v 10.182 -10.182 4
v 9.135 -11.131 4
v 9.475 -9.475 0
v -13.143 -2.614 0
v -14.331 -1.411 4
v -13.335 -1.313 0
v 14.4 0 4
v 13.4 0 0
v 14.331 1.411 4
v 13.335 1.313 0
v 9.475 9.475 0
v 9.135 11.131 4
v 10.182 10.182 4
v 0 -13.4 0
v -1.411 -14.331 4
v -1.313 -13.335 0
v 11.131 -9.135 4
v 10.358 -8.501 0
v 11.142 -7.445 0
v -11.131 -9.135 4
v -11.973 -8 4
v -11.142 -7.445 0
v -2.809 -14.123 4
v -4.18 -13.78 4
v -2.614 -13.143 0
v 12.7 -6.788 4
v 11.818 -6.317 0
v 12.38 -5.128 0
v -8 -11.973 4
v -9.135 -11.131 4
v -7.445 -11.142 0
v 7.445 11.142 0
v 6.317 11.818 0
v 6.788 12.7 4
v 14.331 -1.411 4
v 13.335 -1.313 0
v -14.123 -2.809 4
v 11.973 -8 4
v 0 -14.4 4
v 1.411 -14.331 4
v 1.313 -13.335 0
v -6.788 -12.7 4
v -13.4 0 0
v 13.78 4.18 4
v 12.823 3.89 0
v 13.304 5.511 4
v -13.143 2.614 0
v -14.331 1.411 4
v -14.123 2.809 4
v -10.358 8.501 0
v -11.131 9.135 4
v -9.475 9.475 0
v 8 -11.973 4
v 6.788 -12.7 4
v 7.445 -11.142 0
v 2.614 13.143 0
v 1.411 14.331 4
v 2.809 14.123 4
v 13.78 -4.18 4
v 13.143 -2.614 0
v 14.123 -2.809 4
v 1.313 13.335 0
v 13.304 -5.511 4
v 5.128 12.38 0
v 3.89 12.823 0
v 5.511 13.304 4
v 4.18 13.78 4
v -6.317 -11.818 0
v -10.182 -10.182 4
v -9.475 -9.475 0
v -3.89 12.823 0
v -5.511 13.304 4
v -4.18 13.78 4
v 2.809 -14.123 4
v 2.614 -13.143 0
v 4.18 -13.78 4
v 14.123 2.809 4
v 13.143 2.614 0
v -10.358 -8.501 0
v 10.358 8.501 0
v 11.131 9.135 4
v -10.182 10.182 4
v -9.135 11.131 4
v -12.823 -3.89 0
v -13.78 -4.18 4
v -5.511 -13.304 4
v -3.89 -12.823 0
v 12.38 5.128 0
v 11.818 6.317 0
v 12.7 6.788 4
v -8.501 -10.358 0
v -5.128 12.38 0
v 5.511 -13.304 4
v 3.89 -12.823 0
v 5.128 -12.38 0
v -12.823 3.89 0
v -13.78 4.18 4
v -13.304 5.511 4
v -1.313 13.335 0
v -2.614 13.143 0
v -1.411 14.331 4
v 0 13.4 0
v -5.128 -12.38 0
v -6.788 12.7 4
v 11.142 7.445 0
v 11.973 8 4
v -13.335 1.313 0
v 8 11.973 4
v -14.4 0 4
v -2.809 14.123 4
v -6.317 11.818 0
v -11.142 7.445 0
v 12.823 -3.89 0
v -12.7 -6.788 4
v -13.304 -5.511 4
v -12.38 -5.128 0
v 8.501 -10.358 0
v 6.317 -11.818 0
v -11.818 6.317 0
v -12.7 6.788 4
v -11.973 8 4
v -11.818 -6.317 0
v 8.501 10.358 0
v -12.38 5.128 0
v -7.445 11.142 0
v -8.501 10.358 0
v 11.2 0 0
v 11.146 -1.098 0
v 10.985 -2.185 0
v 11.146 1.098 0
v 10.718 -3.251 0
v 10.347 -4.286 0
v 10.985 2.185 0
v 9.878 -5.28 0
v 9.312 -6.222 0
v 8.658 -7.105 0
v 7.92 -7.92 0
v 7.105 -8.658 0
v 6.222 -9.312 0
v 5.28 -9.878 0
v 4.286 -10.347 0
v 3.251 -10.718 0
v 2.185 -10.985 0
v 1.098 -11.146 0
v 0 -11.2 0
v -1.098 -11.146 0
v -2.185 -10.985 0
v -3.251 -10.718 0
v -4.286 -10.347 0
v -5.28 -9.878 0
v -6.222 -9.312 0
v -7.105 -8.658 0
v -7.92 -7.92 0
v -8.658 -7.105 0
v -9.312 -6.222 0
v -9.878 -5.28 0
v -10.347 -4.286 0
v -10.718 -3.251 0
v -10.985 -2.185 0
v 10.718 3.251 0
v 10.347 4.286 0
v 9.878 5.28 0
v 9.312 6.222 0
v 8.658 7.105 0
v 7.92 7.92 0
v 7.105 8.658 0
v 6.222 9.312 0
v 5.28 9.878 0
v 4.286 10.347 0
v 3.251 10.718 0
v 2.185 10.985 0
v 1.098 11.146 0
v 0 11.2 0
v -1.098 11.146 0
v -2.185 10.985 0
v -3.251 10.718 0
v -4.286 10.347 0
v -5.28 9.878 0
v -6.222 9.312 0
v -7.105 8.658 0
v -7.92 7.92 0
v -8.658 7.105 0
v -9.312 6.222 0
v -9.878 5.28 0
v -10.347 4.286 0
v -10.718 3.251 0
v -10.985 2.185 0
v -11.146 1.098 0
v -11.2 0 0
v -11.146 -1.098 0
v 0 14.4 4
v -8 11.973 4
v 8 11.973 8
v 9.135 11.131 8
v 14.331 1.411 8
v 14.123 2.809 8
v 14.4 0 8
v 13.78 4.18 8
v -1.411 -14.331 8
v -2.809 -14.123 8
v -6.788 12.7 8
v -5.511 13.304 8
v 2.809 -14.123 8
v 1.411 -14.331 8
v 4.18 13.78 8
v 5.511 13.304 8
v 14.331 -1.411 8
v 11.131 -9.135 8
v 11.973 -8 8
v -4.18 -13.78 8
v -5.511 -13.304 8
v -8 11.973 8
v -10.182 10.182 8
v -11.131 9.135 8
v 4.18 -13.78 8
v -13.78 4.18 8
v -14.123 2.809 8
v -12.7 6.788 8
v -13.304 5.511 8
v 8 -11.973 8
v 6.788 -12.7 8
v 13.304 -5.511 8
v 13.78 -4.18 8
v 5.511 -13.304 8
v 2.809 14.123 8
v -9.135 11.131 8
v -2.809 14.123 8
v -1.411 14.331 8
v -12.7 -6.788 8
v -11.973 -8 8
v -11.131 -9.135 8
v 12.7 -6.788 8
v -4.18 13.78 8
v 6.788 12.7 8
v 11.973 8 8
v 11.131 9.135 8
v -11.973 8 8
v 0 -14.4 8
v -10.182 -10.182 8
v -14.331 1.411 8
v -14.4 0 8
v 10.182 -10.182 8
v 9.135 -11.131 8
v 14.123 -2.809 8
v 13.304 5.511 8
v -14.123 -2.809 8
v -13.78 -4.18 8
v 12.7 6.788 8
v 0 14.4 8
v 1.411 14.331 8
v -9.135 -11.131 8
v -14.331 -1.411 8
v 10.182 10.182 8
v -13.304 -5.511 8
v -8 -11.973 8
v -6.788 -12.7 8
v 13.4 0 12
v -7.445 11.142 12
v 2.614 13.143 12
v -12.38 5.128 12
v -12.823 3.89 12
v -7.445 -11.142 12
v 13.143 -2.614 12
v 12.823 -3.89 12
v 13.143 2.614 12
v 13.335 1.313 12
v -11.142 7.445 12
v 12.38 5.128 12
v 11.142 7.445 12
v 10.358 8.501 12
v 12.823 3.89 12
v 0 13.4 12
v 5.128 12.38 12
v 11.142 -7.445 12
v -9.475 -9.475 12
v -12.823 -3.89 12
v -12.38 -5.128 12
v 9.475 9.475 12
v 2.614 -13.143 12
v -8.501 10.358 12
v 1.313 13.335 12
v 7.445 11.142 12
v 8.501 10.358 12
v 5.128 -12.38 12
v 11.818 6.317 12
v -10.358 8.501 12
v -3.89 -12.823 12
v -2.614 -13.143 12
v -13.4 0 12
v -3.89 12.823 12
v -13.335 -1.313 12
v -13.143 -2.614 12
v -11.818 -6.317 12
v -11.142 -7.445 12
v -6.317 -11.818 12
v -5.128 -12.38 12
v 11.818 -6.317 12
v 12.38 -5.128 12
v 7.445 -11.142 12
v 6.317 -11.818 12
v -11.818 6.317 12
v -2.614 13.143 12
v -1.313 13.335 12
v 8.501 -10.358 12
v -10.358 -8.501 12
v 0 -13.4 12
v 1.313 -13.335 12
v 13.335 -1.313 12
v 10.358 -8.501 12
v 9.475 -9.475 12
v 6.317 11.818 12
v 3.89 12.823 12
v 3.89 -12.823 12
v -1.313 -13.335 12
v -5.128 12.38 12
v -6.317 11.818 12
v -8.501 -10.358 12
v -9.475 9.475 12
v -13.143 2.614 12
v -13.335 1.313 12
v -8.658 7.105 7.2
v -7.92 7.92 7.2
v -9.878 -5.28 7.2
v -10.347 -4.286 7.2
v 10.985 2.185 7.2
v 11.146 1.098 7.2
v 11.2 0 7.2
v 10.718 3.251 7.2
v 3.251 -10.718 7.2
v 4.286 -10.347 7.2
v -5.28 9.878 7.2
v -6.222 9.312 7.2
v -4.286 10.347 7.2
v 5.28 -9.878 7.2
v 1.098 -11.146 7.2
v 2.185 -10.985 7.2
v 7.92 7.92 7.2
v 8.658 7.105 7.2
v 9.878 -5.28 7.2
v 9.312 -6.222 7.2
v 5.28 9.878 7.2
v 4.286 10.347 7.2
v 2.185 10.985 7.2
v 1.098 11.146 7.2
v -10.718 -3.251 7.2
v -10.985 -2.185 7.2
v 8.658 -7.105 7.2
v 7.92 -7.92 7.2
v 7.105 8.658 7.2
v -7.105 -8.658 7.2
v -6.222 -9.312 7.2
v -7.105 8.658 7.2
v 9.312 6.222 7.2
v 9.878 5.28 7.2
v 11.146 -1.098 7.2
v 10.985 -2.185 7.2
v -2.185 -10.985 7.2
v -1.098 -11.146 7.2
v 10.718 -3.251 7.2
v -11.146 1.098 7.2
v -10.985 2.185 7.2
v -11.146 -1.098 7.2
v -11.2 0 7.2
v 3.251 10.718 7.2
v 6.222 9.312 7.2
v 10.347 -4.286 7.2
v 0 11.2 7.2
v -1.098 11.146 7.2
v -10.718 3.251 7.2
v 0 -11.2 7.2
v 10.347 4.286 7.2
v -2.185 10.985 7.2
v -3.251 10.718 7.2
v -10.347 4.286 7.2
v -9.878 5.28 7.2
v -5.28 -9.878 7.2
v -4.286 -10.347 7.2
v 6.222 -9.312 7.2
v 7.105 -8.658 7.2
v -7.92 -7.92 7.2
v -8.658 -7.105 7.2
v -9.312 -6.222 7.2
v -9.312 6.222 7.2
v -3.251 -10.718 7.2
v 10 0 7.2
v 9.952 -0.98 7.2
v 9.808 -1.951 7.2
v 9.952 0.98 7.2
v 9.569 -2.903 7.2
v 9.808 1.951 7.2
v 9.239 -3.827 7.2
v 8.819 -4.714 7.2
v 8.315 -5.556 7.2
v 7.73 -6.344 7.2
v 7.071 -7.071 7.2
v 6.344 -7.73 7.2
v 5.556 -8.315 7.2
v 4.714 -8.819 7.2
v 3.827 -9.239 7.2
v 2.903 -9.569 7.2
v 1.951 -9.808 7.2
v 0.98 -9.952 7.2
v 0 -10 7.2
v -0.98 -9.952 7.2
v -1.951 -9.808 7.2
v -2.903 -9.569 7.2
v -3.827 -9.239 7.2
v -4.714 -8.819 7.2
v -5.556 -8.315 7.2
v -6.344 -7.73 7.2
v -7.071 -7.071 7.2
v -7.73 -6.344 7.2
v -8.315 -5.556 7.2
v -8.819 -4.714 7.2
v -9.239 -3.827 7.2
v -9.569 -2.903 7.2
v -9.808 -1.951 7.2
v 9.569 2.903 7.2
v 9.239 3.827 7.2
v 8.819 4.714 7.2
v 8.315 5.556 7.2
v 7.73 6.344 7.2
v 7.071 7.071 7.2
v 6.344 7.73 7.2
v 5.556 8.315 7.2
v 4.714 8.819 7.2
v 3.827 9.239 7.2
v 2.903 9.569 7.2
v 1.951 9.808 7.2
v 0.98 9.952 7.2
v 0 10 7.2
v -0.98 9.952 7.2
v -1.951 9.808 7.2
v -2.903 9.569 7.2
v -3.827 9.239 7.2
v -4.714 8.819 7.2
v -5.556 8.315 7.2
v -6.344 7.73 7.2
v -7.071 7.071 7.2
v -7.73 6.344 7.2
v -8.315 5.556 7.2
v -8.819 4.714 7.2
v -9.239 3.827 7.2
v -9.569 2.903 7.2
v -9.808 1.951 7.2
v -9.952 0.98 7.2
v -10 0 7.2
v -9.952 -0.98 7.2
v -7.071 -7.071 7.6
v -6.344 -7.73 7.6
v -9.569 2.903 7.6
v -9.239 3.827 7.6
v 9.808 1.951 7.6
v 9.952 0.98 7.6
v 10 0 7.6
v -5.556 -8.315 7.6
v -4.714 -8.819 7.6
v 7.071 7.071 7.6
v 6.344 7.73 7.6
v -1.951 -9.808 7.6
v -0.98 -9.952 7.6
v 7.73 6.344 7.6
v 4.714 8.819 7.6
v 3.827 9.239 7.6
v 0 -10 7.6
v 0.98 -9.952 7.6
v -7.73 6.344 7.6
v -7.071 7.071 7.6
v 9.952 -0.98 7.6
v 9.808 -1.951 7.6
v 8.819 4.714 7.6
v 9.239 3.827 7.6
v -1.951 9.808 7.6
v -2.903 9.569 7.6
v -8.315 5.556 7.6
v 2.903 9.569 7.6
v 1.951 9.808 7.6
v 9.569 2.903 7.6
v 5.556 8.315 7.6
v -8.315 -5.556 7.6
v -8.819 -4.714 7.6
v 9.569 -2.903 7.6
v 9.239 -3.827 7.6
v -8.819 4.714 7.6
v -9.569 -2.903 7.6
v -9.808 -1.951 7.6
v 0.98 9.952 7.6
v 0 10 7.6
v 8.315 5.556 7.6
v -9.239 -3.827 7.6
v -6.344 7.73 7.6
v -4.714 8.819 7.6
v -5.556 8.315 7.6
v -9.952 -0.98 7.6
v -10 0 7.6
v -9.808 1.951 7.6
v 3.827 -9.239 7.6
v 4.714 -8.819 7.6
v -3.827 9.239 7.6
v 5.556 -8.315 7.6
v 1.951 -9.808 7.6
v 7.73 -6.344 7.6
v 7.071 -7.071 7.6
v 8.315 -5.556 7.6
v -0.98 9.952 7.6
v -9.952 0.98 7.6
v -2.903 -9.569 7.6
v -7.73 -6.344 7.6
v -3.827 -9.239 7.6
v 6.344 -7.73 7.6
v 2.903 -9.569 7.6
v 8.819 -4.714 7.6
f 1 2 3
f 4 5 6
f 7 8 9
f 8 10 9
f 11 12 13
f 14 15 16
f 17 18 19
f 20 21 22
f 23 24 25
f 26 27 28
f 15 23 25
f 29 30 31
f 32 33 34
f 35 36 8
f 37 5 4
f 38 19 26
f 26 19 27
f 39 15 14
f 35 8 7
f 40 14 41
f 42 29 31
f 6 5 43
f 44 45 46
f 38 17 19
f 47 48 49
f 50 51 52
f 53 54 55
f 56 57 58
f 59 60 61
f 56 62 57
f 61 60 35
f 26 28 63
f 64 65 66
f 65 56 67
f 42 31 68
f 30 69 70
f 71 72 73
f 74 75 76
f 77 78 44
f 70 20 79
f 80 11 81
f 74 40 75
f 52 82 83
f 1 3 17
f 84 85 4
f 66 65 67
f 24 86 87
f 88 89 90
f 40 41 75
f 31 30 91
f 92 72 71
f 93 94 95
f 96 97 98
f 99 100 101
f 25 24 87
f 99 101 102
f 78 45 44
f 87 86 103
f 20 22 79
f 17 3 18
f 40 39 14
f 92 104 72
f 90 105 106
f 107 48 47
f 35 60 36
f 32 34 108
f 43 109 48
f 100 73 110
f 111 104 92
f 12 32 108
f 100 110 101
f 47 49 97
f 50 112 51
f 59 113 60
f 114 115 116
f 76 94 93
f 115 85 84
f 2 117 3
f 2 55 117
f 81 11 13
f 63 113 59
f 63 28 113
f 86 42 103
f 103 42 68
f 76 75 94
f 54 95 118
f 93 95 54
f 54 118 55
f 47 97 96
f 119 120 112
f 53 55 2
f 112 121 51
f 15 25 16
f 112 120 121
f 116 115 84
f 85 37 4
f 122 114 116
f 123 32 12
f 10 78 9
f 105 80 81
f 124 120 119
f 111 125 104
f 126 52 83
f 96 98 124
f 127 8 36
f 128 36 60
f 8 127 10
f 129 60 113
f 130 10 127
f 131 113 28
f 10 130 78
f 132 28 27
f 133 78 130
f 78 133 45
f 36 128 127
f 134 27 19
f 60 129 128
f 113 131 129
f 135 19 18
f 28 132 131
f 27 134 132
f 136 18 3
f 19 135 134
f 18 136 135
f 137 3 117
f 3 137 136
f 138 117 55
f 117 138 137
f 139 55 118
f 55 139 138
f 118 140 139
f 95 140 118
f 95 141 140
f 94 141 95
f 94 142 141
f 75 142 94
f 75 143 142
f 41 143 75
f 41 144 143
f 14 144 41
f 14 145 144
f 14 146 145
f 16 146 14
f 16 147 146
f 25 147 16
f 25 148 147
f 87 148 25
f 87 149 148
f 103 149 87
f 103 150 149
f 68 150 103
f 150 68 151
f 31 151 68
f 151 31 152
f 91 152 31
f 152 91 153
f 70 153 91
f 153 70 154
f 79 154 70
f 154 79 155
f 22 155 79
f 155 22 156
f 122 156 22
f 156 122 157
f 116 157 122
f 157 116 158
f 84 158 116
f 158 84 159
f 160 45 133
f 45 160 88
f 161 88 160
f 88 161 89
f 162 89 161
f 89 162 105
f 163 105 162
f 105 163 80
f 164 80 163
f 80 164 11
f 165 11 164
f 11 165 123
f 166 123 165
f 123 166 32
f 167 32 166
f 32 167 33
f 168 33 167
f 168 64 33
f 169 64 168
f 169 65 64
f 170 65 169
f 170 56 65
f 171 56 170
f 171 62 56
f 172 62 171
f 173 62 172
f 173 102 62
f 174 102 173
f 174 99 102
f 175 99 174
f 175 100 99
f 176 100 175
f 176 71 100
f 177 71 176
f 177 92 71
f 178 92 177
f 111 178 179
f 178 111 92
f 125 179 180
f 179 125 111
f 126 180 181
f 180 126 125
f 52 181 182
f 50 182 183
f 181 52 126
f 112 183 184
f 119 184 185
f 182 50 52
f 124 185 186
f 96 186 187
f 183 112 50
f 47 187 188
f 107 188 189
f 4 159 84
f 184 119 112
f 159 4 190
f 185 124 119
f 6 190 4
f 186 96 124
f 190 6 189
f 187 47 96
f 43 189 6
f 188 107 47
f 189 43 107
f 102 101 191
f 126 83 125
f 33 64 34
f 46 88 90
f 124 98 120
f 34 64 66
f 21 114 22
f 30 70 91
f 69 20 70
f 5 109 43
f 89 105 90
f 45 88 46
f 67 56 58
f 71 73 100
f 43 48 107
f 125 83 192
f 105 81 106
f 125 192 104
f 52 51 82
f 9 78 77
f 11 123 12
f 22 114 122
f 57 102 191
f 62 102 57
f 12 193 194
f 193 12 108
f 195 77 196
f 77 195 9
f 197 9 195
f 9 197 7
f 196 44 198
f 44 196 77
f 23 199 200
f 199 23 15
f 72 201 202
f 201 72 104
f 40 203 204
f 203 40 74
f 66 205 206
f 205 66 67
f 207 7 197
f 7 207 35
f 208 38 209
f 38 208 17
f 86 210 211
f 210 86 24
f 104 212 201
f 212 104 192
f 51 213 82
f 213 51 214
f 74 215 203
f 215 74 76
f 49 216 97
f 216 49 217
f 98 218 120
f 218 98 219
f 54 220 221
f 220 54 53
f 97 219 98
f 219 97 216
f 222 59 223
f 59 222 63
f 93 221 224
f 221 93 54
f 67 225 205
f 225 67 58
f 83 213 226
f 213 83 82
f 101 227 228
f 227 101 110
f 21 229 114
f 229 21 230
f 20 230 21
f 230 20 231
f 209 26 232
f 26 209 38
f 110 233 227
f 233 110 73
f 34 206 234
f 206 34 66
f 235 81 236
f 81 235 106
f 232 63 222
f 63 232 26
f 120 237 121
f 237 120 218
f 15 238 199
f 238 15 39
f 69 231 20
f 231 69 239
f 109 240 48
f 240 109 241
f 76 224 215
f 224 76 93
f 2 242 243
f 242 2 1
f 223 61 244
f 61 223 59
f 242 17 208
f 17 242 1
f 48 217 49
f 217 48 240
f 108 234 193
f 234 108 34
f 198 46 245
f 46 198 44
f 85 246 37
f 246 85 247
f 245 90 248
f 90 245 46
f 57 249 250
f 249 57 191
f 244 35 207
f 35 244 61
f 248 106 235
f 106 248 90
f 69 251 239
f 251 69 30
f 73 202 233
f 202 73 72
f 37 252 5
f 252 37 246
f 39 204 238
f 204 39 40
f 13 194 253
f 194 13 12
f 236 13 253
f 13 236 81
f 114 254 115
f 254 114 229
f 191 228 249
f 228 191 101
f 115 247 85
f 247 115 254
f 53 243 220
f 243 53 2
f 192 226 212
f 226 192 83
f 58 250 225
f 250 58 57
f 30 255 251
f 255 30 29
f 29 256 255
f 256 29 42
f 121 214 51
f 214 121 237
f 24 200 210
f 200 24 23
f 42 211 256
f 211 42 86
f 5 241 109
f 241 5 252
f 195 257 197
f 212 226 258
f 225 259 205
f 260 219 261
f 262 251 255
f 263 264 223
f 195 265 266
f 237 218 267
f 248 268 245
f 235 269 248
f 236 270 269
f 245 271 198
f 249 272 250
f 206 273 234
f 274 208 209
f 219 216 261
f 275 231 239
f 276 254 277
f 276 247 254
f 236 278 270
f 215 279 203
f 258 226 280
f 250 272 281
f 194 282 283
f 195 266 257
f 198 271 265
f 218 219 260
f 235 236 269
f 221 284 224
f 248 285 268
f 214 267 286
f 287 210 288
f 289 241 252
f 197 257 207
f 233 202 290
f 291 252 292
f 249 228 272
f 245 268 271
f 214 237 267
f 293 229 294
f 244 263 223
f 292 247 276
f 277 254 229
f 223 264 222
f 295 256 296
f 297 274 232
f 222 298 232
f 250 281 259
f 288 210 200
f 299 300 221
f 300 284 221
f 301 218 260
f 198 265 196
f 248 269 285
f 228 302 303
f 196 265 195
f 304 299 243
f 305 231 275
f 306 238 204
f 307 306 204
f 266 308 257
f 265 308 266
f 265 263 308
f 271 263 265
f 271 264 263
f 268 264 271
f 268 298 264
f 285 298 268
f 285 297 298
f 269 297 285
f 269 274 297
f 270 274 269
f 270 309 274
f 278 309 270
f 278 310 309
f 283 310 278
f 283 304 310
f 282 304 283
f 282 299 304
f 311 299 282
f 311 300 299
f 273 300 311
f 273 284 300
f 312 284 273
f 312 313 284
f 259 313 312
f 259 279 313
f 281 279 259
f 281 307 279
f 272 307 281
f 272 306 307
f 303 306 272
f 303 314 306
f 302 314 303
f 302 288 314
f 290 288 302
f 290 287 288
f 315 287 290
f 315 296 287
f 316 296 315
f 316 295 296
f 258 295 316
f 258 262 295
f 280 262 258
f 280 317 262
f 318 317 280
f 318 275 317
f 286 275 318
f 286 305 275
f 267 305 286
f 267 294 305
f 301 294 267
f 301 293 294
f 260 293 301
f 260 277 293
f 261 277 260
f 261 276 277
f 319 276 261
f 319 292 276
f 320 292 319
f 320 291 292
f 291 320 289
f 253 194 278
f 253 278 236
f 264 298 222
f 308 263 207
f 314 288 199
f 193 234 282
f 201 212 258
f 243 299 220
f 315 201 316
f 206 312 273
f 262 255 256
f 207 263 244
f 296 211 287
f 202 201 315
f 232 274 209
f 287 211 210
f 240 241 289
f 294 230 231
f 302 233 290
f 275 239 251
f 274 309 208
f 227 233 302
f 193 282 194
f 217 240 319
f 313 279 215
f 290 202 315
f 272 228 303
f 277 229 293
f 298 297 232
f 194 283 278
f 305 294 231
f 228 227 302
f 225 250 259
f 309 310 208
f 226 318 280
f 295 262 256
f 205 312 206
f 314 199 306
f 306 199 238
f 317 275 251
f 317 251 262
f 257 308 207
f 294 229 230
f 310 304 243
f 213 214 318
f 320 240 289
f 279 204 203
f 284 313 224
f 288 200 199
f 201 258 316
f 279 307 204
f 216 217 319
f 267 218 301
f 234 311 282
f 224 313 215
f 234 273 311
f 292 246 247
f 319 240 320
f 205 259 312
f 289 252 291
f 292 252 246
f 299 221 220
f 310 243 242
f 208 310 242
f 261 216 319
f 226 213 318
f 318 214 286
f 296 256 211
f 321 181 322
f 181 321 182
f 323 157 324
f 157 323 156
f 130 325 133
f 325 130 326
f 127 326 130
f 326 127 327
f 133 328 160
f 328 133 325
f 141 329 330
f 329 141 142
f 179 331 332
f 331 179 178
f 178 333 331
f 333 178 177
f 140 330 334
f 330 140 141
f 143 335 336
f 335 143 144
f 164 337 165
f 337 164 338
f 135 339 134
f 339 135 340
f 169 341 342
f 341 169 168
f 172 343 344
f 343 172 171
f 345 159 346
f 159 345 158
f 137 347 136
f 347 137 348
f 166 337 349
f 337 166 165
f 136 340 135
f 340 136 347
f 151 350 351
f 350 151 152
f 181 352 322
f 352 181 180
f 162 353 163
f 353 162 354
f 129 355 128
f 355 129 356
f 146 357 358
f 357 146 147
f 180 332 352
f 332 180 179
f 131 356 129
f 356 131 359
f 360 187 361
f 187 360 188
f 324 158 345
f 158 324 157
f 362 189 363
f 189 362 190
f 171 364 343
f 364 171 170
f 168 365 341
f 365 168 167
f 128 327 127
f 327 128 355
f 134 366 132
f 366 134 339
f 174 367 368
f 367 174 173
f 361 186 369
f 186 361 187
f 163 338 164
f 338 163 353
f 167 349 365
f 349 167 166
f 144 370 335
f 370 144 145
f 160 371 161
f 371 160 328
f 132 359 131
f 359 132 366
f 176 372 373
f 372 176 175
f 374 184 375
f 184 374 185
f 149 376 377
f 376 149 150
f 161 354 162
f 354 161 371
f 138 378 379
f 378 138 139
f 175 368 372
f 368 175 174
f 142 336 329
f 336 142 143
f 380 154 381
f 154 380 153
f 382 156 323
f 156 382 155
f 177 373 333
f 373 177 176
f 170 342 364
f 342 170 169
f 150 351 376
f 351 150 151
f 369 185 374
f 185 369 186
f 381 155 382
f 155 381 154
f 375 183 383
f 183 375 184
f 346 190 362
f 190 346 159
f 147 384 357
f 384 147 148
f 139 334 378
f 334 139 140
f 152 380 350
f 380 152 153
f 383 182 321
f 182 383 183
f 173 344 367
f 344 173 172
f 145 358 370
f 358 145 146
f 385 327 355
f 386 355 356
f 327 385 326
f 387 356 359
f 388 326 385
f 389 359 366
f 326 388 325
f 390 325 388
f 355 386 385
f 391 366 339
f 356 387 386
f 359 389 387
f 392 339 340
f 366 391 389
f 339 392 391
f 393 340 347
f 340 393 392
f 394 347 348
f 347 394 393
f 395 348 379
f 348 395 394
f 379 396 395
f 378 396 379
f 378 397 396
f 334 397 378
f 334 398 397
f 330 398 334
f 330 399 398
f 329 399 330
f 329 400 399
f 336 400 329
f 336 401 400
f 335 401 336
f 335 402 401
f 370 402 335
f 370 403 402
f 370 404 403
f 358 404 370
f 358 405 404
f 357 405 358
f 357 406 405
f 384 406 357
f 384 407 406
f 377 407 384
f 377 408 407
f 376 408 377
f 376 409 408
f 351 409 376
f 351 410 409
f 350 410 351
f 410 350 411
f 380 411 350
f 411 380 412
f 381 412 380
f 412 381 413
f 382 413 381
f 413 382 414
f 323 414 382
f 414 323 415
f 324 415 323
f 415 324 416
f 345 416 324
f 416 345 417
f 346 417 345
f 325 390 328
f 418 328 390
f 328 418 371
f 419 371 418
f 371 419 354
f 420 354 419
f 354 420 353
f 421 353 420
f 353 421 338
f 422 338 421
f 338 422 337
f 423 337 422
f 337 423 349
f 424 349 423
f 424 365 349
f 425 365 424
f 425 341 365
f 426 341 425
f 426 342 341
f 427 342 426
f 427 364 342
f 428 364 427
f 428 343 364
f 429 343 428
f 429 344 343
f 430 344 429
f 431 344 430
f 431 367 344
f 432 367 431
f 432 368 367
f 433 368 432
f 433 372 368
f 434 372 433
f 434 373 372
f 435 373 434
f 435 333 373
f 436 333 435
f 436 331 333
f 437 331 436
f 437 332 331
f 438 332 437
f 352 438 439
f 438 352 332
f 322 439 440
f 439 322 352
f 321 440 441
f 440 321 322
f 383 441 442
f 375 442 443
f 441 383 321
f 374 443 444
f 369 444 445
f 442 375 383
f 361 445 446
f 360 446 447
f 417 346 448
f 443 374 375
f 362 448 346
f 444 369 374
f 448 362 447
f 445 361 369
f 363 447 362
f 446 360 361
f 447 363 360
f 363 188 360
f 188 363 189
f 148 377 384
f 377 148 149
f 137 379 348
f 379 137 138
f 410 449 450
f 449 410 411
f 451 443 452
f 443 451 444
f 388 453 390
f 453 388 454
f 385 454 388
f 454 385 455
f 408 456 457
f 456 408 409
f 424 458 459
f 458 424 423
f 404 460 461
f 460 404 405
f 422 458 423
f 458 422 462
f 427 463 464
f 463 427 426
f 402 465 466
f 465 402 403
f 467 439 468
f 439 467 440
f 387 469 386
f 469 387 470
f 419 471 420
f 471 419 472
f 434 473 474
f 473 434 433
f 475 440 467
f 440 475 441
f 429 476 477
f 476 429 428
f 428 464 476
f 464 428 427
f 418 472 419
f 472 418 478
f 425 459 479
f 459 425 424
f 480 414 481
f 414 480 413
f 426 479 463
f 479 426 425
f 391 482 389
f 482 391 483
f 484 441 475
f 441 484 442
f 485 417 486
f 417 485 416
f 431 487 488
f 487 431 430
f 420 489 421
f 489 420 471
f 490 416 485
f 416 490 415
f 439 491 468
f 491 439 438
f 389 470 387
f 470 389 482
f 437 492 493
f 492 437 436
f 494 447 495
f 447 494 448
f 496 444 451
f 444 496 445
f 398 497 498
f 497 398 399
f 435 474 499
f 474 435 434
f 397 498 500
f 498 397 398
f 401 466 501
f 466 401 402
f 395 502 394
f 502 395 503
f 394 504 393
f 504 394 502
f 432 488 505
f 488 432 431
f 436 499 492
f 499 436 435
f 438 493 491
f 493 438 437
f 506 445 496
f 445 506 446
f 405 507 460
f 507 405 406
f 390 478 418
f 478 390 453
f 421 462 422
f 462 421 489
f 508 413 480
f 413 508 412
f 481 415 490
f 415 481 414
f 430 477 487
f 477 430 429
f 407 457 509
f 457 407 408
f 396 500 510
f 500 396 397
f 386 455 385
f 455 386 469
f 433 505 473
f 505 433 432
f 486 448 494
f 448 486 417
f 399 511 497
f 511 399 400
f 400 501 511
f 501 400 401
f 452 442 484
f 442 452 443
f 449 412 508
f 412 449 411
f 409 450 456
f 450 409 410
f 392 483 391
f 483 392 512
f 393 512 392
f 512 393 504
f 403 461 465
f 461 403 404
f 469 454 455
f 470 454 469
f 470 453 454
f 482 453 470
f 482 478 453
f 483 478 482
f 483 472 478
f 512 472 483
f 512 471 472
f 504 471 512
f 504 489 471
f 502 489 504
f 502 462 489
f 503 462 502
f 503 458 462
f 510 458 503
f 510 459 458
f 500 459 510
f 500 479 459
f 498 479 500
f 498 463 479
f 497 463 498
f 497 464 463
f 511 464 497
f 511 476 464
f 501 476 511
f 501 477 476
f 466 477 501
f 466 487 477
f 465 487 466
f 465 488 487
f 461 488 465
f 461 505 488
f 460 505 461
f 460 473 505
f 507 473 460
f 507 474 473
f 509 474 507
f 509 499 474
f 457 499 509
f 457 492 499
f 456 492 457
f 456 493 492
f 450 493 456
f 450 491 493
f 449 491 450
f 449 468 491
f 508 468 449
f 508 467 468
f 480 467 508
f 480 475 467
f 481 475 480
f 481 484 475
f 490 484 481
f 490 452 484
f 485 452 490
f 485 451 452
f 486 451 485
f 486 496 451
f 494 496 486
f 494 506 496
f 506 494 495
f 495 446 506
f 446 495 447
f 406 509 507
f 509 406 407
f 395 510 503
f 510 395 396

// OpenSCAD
// Fred tracks
// Idea: Skinny tracks on each side (wheel-width)
// "Segments" of track whose angles change depending on
// diameter. Tracks aren't circular, but the pulleys are
// circular, and they'll be printed circular.

$fn = 64;

segment_len = 8;
segment_h = 2.4;
segment_wid = 9.0; // Also track wid
segment_wall_thick = 1.32; // 3 0.44 perimeters
segment_tip_len = 6.0;
segment_sloping = 2.0;
segment_overlap = 2.0;

module segment2D() {
    polygon([
        [-segment_len/2-segment_overlap/2,0],
        [-segment_tip_len/2,segment_h+segment_overlap],
        [segment_tip_len/2,segment_h+segment_overlap],
        [segment_len/2+segment_overlap/2,0]
    ]);
}
//segment2D();

module uncutSegment() {
    union() {
        linear_extrude(segment_sloping, scale=1/0.6)
        scale(0.6)
        segment2D();
        translate([0,0,segment_sloping])
        linear_extrude(segment_wid-2*segment_sloping)
        segment2D();
        translate([0,0,segment_wid])
        rotate([0,180,0])
        linear_extrude(segment_sloping, scale=1/0.6)
        scale(0.6)
        segment2D();
    }
}

module segment() {
    difference() {
        uncutSegment();
        translate([0,0,segment_wall_thick])
        scale((segment_h-segment_wall_thick/2)/segment_h)
        uncutSegment();
    }
}

track_thick = 4;
track_len = 223;
track_d = track_len/PI;
track_wid = 12.0;
// No tread, just a thick belt
module simpleTrack() {
    linear_extrude(track_wid)
    difference() {
        offset(track_thick)
        circle(d=track_d);
        circle(d=track_d);
    }
}
//simpleTrack();

num_cuts = 24;
cut_wid = 4;
cut_h = track_thick/2;

track_v_size = 2;
groove_size_extra = 0.5;
module trackV2D(extra=0.0) {
    polygon([
        [0,track_v_size+extra],
        [-track_v_size-extra,0],
        [0,-track_v_size-extra]
    ]);
}

module trackV(d = track_d, extra=0.0) {
    translate([0,0,track_wid/2])
    rotate_extrude(360)
    translate([d/2,0,0])
    trackV2D(extra);
}

module cutTrack() {
    trackV();
    difference() {
        simpleTrack();
        for (i=[0:num_cuts-1]) {
            rotate([0,0,360/num_cuts*i])
            translate([track_d/2+track_thick,0,0])
            linear_extrude(track_wid)
            polygon([
                [0,cut_wid/2],
                [-cut_h,0],
                [0,-cut_wid/2]
            ]);
        }
    }
}
//cutTrack();

bearing_od = 22+0.4;
bearing_id = 8+0.4;
bearing_wid = 7.2;
bearing_wall_thick = 1.2;

module uncutCrownedPulley(d, sloping) {
    cylinder(d1=d-2*sloping, d2=d, h=track_wid/3);
    translate([0,0,track_wid/3])
    cylinder(d=d, h=track_wid/3);
    translate([0,0,track_wid*2/3])
    cylinder(d2=d-2*sloping, d1=d, h=track_wid/3);
}

pulley_min_thick = 3.2;
module bearingCrownedPulley() {
    difference() {
        uncutCrownedPulley(bearing_od+2*pulley_min_thick, 1.0);
        cylinder(d=bearing_od, h=bearing_wid);
        cylinder(d=bearing_od-2*bearing_wall_thick, h=bearing_wid+0.4);
        #trackV(bearing_od+2*pulley_min_thick, groove_size_extra);
    }
}

motor_pulley_d = 52;
module motorCrownedPulley() {
    difference() {
        uncutCrownedPulley(motor_pulley_d, 1.0);
    }
}
//motorCrownedPulley();
bearingCrownedPulley();
